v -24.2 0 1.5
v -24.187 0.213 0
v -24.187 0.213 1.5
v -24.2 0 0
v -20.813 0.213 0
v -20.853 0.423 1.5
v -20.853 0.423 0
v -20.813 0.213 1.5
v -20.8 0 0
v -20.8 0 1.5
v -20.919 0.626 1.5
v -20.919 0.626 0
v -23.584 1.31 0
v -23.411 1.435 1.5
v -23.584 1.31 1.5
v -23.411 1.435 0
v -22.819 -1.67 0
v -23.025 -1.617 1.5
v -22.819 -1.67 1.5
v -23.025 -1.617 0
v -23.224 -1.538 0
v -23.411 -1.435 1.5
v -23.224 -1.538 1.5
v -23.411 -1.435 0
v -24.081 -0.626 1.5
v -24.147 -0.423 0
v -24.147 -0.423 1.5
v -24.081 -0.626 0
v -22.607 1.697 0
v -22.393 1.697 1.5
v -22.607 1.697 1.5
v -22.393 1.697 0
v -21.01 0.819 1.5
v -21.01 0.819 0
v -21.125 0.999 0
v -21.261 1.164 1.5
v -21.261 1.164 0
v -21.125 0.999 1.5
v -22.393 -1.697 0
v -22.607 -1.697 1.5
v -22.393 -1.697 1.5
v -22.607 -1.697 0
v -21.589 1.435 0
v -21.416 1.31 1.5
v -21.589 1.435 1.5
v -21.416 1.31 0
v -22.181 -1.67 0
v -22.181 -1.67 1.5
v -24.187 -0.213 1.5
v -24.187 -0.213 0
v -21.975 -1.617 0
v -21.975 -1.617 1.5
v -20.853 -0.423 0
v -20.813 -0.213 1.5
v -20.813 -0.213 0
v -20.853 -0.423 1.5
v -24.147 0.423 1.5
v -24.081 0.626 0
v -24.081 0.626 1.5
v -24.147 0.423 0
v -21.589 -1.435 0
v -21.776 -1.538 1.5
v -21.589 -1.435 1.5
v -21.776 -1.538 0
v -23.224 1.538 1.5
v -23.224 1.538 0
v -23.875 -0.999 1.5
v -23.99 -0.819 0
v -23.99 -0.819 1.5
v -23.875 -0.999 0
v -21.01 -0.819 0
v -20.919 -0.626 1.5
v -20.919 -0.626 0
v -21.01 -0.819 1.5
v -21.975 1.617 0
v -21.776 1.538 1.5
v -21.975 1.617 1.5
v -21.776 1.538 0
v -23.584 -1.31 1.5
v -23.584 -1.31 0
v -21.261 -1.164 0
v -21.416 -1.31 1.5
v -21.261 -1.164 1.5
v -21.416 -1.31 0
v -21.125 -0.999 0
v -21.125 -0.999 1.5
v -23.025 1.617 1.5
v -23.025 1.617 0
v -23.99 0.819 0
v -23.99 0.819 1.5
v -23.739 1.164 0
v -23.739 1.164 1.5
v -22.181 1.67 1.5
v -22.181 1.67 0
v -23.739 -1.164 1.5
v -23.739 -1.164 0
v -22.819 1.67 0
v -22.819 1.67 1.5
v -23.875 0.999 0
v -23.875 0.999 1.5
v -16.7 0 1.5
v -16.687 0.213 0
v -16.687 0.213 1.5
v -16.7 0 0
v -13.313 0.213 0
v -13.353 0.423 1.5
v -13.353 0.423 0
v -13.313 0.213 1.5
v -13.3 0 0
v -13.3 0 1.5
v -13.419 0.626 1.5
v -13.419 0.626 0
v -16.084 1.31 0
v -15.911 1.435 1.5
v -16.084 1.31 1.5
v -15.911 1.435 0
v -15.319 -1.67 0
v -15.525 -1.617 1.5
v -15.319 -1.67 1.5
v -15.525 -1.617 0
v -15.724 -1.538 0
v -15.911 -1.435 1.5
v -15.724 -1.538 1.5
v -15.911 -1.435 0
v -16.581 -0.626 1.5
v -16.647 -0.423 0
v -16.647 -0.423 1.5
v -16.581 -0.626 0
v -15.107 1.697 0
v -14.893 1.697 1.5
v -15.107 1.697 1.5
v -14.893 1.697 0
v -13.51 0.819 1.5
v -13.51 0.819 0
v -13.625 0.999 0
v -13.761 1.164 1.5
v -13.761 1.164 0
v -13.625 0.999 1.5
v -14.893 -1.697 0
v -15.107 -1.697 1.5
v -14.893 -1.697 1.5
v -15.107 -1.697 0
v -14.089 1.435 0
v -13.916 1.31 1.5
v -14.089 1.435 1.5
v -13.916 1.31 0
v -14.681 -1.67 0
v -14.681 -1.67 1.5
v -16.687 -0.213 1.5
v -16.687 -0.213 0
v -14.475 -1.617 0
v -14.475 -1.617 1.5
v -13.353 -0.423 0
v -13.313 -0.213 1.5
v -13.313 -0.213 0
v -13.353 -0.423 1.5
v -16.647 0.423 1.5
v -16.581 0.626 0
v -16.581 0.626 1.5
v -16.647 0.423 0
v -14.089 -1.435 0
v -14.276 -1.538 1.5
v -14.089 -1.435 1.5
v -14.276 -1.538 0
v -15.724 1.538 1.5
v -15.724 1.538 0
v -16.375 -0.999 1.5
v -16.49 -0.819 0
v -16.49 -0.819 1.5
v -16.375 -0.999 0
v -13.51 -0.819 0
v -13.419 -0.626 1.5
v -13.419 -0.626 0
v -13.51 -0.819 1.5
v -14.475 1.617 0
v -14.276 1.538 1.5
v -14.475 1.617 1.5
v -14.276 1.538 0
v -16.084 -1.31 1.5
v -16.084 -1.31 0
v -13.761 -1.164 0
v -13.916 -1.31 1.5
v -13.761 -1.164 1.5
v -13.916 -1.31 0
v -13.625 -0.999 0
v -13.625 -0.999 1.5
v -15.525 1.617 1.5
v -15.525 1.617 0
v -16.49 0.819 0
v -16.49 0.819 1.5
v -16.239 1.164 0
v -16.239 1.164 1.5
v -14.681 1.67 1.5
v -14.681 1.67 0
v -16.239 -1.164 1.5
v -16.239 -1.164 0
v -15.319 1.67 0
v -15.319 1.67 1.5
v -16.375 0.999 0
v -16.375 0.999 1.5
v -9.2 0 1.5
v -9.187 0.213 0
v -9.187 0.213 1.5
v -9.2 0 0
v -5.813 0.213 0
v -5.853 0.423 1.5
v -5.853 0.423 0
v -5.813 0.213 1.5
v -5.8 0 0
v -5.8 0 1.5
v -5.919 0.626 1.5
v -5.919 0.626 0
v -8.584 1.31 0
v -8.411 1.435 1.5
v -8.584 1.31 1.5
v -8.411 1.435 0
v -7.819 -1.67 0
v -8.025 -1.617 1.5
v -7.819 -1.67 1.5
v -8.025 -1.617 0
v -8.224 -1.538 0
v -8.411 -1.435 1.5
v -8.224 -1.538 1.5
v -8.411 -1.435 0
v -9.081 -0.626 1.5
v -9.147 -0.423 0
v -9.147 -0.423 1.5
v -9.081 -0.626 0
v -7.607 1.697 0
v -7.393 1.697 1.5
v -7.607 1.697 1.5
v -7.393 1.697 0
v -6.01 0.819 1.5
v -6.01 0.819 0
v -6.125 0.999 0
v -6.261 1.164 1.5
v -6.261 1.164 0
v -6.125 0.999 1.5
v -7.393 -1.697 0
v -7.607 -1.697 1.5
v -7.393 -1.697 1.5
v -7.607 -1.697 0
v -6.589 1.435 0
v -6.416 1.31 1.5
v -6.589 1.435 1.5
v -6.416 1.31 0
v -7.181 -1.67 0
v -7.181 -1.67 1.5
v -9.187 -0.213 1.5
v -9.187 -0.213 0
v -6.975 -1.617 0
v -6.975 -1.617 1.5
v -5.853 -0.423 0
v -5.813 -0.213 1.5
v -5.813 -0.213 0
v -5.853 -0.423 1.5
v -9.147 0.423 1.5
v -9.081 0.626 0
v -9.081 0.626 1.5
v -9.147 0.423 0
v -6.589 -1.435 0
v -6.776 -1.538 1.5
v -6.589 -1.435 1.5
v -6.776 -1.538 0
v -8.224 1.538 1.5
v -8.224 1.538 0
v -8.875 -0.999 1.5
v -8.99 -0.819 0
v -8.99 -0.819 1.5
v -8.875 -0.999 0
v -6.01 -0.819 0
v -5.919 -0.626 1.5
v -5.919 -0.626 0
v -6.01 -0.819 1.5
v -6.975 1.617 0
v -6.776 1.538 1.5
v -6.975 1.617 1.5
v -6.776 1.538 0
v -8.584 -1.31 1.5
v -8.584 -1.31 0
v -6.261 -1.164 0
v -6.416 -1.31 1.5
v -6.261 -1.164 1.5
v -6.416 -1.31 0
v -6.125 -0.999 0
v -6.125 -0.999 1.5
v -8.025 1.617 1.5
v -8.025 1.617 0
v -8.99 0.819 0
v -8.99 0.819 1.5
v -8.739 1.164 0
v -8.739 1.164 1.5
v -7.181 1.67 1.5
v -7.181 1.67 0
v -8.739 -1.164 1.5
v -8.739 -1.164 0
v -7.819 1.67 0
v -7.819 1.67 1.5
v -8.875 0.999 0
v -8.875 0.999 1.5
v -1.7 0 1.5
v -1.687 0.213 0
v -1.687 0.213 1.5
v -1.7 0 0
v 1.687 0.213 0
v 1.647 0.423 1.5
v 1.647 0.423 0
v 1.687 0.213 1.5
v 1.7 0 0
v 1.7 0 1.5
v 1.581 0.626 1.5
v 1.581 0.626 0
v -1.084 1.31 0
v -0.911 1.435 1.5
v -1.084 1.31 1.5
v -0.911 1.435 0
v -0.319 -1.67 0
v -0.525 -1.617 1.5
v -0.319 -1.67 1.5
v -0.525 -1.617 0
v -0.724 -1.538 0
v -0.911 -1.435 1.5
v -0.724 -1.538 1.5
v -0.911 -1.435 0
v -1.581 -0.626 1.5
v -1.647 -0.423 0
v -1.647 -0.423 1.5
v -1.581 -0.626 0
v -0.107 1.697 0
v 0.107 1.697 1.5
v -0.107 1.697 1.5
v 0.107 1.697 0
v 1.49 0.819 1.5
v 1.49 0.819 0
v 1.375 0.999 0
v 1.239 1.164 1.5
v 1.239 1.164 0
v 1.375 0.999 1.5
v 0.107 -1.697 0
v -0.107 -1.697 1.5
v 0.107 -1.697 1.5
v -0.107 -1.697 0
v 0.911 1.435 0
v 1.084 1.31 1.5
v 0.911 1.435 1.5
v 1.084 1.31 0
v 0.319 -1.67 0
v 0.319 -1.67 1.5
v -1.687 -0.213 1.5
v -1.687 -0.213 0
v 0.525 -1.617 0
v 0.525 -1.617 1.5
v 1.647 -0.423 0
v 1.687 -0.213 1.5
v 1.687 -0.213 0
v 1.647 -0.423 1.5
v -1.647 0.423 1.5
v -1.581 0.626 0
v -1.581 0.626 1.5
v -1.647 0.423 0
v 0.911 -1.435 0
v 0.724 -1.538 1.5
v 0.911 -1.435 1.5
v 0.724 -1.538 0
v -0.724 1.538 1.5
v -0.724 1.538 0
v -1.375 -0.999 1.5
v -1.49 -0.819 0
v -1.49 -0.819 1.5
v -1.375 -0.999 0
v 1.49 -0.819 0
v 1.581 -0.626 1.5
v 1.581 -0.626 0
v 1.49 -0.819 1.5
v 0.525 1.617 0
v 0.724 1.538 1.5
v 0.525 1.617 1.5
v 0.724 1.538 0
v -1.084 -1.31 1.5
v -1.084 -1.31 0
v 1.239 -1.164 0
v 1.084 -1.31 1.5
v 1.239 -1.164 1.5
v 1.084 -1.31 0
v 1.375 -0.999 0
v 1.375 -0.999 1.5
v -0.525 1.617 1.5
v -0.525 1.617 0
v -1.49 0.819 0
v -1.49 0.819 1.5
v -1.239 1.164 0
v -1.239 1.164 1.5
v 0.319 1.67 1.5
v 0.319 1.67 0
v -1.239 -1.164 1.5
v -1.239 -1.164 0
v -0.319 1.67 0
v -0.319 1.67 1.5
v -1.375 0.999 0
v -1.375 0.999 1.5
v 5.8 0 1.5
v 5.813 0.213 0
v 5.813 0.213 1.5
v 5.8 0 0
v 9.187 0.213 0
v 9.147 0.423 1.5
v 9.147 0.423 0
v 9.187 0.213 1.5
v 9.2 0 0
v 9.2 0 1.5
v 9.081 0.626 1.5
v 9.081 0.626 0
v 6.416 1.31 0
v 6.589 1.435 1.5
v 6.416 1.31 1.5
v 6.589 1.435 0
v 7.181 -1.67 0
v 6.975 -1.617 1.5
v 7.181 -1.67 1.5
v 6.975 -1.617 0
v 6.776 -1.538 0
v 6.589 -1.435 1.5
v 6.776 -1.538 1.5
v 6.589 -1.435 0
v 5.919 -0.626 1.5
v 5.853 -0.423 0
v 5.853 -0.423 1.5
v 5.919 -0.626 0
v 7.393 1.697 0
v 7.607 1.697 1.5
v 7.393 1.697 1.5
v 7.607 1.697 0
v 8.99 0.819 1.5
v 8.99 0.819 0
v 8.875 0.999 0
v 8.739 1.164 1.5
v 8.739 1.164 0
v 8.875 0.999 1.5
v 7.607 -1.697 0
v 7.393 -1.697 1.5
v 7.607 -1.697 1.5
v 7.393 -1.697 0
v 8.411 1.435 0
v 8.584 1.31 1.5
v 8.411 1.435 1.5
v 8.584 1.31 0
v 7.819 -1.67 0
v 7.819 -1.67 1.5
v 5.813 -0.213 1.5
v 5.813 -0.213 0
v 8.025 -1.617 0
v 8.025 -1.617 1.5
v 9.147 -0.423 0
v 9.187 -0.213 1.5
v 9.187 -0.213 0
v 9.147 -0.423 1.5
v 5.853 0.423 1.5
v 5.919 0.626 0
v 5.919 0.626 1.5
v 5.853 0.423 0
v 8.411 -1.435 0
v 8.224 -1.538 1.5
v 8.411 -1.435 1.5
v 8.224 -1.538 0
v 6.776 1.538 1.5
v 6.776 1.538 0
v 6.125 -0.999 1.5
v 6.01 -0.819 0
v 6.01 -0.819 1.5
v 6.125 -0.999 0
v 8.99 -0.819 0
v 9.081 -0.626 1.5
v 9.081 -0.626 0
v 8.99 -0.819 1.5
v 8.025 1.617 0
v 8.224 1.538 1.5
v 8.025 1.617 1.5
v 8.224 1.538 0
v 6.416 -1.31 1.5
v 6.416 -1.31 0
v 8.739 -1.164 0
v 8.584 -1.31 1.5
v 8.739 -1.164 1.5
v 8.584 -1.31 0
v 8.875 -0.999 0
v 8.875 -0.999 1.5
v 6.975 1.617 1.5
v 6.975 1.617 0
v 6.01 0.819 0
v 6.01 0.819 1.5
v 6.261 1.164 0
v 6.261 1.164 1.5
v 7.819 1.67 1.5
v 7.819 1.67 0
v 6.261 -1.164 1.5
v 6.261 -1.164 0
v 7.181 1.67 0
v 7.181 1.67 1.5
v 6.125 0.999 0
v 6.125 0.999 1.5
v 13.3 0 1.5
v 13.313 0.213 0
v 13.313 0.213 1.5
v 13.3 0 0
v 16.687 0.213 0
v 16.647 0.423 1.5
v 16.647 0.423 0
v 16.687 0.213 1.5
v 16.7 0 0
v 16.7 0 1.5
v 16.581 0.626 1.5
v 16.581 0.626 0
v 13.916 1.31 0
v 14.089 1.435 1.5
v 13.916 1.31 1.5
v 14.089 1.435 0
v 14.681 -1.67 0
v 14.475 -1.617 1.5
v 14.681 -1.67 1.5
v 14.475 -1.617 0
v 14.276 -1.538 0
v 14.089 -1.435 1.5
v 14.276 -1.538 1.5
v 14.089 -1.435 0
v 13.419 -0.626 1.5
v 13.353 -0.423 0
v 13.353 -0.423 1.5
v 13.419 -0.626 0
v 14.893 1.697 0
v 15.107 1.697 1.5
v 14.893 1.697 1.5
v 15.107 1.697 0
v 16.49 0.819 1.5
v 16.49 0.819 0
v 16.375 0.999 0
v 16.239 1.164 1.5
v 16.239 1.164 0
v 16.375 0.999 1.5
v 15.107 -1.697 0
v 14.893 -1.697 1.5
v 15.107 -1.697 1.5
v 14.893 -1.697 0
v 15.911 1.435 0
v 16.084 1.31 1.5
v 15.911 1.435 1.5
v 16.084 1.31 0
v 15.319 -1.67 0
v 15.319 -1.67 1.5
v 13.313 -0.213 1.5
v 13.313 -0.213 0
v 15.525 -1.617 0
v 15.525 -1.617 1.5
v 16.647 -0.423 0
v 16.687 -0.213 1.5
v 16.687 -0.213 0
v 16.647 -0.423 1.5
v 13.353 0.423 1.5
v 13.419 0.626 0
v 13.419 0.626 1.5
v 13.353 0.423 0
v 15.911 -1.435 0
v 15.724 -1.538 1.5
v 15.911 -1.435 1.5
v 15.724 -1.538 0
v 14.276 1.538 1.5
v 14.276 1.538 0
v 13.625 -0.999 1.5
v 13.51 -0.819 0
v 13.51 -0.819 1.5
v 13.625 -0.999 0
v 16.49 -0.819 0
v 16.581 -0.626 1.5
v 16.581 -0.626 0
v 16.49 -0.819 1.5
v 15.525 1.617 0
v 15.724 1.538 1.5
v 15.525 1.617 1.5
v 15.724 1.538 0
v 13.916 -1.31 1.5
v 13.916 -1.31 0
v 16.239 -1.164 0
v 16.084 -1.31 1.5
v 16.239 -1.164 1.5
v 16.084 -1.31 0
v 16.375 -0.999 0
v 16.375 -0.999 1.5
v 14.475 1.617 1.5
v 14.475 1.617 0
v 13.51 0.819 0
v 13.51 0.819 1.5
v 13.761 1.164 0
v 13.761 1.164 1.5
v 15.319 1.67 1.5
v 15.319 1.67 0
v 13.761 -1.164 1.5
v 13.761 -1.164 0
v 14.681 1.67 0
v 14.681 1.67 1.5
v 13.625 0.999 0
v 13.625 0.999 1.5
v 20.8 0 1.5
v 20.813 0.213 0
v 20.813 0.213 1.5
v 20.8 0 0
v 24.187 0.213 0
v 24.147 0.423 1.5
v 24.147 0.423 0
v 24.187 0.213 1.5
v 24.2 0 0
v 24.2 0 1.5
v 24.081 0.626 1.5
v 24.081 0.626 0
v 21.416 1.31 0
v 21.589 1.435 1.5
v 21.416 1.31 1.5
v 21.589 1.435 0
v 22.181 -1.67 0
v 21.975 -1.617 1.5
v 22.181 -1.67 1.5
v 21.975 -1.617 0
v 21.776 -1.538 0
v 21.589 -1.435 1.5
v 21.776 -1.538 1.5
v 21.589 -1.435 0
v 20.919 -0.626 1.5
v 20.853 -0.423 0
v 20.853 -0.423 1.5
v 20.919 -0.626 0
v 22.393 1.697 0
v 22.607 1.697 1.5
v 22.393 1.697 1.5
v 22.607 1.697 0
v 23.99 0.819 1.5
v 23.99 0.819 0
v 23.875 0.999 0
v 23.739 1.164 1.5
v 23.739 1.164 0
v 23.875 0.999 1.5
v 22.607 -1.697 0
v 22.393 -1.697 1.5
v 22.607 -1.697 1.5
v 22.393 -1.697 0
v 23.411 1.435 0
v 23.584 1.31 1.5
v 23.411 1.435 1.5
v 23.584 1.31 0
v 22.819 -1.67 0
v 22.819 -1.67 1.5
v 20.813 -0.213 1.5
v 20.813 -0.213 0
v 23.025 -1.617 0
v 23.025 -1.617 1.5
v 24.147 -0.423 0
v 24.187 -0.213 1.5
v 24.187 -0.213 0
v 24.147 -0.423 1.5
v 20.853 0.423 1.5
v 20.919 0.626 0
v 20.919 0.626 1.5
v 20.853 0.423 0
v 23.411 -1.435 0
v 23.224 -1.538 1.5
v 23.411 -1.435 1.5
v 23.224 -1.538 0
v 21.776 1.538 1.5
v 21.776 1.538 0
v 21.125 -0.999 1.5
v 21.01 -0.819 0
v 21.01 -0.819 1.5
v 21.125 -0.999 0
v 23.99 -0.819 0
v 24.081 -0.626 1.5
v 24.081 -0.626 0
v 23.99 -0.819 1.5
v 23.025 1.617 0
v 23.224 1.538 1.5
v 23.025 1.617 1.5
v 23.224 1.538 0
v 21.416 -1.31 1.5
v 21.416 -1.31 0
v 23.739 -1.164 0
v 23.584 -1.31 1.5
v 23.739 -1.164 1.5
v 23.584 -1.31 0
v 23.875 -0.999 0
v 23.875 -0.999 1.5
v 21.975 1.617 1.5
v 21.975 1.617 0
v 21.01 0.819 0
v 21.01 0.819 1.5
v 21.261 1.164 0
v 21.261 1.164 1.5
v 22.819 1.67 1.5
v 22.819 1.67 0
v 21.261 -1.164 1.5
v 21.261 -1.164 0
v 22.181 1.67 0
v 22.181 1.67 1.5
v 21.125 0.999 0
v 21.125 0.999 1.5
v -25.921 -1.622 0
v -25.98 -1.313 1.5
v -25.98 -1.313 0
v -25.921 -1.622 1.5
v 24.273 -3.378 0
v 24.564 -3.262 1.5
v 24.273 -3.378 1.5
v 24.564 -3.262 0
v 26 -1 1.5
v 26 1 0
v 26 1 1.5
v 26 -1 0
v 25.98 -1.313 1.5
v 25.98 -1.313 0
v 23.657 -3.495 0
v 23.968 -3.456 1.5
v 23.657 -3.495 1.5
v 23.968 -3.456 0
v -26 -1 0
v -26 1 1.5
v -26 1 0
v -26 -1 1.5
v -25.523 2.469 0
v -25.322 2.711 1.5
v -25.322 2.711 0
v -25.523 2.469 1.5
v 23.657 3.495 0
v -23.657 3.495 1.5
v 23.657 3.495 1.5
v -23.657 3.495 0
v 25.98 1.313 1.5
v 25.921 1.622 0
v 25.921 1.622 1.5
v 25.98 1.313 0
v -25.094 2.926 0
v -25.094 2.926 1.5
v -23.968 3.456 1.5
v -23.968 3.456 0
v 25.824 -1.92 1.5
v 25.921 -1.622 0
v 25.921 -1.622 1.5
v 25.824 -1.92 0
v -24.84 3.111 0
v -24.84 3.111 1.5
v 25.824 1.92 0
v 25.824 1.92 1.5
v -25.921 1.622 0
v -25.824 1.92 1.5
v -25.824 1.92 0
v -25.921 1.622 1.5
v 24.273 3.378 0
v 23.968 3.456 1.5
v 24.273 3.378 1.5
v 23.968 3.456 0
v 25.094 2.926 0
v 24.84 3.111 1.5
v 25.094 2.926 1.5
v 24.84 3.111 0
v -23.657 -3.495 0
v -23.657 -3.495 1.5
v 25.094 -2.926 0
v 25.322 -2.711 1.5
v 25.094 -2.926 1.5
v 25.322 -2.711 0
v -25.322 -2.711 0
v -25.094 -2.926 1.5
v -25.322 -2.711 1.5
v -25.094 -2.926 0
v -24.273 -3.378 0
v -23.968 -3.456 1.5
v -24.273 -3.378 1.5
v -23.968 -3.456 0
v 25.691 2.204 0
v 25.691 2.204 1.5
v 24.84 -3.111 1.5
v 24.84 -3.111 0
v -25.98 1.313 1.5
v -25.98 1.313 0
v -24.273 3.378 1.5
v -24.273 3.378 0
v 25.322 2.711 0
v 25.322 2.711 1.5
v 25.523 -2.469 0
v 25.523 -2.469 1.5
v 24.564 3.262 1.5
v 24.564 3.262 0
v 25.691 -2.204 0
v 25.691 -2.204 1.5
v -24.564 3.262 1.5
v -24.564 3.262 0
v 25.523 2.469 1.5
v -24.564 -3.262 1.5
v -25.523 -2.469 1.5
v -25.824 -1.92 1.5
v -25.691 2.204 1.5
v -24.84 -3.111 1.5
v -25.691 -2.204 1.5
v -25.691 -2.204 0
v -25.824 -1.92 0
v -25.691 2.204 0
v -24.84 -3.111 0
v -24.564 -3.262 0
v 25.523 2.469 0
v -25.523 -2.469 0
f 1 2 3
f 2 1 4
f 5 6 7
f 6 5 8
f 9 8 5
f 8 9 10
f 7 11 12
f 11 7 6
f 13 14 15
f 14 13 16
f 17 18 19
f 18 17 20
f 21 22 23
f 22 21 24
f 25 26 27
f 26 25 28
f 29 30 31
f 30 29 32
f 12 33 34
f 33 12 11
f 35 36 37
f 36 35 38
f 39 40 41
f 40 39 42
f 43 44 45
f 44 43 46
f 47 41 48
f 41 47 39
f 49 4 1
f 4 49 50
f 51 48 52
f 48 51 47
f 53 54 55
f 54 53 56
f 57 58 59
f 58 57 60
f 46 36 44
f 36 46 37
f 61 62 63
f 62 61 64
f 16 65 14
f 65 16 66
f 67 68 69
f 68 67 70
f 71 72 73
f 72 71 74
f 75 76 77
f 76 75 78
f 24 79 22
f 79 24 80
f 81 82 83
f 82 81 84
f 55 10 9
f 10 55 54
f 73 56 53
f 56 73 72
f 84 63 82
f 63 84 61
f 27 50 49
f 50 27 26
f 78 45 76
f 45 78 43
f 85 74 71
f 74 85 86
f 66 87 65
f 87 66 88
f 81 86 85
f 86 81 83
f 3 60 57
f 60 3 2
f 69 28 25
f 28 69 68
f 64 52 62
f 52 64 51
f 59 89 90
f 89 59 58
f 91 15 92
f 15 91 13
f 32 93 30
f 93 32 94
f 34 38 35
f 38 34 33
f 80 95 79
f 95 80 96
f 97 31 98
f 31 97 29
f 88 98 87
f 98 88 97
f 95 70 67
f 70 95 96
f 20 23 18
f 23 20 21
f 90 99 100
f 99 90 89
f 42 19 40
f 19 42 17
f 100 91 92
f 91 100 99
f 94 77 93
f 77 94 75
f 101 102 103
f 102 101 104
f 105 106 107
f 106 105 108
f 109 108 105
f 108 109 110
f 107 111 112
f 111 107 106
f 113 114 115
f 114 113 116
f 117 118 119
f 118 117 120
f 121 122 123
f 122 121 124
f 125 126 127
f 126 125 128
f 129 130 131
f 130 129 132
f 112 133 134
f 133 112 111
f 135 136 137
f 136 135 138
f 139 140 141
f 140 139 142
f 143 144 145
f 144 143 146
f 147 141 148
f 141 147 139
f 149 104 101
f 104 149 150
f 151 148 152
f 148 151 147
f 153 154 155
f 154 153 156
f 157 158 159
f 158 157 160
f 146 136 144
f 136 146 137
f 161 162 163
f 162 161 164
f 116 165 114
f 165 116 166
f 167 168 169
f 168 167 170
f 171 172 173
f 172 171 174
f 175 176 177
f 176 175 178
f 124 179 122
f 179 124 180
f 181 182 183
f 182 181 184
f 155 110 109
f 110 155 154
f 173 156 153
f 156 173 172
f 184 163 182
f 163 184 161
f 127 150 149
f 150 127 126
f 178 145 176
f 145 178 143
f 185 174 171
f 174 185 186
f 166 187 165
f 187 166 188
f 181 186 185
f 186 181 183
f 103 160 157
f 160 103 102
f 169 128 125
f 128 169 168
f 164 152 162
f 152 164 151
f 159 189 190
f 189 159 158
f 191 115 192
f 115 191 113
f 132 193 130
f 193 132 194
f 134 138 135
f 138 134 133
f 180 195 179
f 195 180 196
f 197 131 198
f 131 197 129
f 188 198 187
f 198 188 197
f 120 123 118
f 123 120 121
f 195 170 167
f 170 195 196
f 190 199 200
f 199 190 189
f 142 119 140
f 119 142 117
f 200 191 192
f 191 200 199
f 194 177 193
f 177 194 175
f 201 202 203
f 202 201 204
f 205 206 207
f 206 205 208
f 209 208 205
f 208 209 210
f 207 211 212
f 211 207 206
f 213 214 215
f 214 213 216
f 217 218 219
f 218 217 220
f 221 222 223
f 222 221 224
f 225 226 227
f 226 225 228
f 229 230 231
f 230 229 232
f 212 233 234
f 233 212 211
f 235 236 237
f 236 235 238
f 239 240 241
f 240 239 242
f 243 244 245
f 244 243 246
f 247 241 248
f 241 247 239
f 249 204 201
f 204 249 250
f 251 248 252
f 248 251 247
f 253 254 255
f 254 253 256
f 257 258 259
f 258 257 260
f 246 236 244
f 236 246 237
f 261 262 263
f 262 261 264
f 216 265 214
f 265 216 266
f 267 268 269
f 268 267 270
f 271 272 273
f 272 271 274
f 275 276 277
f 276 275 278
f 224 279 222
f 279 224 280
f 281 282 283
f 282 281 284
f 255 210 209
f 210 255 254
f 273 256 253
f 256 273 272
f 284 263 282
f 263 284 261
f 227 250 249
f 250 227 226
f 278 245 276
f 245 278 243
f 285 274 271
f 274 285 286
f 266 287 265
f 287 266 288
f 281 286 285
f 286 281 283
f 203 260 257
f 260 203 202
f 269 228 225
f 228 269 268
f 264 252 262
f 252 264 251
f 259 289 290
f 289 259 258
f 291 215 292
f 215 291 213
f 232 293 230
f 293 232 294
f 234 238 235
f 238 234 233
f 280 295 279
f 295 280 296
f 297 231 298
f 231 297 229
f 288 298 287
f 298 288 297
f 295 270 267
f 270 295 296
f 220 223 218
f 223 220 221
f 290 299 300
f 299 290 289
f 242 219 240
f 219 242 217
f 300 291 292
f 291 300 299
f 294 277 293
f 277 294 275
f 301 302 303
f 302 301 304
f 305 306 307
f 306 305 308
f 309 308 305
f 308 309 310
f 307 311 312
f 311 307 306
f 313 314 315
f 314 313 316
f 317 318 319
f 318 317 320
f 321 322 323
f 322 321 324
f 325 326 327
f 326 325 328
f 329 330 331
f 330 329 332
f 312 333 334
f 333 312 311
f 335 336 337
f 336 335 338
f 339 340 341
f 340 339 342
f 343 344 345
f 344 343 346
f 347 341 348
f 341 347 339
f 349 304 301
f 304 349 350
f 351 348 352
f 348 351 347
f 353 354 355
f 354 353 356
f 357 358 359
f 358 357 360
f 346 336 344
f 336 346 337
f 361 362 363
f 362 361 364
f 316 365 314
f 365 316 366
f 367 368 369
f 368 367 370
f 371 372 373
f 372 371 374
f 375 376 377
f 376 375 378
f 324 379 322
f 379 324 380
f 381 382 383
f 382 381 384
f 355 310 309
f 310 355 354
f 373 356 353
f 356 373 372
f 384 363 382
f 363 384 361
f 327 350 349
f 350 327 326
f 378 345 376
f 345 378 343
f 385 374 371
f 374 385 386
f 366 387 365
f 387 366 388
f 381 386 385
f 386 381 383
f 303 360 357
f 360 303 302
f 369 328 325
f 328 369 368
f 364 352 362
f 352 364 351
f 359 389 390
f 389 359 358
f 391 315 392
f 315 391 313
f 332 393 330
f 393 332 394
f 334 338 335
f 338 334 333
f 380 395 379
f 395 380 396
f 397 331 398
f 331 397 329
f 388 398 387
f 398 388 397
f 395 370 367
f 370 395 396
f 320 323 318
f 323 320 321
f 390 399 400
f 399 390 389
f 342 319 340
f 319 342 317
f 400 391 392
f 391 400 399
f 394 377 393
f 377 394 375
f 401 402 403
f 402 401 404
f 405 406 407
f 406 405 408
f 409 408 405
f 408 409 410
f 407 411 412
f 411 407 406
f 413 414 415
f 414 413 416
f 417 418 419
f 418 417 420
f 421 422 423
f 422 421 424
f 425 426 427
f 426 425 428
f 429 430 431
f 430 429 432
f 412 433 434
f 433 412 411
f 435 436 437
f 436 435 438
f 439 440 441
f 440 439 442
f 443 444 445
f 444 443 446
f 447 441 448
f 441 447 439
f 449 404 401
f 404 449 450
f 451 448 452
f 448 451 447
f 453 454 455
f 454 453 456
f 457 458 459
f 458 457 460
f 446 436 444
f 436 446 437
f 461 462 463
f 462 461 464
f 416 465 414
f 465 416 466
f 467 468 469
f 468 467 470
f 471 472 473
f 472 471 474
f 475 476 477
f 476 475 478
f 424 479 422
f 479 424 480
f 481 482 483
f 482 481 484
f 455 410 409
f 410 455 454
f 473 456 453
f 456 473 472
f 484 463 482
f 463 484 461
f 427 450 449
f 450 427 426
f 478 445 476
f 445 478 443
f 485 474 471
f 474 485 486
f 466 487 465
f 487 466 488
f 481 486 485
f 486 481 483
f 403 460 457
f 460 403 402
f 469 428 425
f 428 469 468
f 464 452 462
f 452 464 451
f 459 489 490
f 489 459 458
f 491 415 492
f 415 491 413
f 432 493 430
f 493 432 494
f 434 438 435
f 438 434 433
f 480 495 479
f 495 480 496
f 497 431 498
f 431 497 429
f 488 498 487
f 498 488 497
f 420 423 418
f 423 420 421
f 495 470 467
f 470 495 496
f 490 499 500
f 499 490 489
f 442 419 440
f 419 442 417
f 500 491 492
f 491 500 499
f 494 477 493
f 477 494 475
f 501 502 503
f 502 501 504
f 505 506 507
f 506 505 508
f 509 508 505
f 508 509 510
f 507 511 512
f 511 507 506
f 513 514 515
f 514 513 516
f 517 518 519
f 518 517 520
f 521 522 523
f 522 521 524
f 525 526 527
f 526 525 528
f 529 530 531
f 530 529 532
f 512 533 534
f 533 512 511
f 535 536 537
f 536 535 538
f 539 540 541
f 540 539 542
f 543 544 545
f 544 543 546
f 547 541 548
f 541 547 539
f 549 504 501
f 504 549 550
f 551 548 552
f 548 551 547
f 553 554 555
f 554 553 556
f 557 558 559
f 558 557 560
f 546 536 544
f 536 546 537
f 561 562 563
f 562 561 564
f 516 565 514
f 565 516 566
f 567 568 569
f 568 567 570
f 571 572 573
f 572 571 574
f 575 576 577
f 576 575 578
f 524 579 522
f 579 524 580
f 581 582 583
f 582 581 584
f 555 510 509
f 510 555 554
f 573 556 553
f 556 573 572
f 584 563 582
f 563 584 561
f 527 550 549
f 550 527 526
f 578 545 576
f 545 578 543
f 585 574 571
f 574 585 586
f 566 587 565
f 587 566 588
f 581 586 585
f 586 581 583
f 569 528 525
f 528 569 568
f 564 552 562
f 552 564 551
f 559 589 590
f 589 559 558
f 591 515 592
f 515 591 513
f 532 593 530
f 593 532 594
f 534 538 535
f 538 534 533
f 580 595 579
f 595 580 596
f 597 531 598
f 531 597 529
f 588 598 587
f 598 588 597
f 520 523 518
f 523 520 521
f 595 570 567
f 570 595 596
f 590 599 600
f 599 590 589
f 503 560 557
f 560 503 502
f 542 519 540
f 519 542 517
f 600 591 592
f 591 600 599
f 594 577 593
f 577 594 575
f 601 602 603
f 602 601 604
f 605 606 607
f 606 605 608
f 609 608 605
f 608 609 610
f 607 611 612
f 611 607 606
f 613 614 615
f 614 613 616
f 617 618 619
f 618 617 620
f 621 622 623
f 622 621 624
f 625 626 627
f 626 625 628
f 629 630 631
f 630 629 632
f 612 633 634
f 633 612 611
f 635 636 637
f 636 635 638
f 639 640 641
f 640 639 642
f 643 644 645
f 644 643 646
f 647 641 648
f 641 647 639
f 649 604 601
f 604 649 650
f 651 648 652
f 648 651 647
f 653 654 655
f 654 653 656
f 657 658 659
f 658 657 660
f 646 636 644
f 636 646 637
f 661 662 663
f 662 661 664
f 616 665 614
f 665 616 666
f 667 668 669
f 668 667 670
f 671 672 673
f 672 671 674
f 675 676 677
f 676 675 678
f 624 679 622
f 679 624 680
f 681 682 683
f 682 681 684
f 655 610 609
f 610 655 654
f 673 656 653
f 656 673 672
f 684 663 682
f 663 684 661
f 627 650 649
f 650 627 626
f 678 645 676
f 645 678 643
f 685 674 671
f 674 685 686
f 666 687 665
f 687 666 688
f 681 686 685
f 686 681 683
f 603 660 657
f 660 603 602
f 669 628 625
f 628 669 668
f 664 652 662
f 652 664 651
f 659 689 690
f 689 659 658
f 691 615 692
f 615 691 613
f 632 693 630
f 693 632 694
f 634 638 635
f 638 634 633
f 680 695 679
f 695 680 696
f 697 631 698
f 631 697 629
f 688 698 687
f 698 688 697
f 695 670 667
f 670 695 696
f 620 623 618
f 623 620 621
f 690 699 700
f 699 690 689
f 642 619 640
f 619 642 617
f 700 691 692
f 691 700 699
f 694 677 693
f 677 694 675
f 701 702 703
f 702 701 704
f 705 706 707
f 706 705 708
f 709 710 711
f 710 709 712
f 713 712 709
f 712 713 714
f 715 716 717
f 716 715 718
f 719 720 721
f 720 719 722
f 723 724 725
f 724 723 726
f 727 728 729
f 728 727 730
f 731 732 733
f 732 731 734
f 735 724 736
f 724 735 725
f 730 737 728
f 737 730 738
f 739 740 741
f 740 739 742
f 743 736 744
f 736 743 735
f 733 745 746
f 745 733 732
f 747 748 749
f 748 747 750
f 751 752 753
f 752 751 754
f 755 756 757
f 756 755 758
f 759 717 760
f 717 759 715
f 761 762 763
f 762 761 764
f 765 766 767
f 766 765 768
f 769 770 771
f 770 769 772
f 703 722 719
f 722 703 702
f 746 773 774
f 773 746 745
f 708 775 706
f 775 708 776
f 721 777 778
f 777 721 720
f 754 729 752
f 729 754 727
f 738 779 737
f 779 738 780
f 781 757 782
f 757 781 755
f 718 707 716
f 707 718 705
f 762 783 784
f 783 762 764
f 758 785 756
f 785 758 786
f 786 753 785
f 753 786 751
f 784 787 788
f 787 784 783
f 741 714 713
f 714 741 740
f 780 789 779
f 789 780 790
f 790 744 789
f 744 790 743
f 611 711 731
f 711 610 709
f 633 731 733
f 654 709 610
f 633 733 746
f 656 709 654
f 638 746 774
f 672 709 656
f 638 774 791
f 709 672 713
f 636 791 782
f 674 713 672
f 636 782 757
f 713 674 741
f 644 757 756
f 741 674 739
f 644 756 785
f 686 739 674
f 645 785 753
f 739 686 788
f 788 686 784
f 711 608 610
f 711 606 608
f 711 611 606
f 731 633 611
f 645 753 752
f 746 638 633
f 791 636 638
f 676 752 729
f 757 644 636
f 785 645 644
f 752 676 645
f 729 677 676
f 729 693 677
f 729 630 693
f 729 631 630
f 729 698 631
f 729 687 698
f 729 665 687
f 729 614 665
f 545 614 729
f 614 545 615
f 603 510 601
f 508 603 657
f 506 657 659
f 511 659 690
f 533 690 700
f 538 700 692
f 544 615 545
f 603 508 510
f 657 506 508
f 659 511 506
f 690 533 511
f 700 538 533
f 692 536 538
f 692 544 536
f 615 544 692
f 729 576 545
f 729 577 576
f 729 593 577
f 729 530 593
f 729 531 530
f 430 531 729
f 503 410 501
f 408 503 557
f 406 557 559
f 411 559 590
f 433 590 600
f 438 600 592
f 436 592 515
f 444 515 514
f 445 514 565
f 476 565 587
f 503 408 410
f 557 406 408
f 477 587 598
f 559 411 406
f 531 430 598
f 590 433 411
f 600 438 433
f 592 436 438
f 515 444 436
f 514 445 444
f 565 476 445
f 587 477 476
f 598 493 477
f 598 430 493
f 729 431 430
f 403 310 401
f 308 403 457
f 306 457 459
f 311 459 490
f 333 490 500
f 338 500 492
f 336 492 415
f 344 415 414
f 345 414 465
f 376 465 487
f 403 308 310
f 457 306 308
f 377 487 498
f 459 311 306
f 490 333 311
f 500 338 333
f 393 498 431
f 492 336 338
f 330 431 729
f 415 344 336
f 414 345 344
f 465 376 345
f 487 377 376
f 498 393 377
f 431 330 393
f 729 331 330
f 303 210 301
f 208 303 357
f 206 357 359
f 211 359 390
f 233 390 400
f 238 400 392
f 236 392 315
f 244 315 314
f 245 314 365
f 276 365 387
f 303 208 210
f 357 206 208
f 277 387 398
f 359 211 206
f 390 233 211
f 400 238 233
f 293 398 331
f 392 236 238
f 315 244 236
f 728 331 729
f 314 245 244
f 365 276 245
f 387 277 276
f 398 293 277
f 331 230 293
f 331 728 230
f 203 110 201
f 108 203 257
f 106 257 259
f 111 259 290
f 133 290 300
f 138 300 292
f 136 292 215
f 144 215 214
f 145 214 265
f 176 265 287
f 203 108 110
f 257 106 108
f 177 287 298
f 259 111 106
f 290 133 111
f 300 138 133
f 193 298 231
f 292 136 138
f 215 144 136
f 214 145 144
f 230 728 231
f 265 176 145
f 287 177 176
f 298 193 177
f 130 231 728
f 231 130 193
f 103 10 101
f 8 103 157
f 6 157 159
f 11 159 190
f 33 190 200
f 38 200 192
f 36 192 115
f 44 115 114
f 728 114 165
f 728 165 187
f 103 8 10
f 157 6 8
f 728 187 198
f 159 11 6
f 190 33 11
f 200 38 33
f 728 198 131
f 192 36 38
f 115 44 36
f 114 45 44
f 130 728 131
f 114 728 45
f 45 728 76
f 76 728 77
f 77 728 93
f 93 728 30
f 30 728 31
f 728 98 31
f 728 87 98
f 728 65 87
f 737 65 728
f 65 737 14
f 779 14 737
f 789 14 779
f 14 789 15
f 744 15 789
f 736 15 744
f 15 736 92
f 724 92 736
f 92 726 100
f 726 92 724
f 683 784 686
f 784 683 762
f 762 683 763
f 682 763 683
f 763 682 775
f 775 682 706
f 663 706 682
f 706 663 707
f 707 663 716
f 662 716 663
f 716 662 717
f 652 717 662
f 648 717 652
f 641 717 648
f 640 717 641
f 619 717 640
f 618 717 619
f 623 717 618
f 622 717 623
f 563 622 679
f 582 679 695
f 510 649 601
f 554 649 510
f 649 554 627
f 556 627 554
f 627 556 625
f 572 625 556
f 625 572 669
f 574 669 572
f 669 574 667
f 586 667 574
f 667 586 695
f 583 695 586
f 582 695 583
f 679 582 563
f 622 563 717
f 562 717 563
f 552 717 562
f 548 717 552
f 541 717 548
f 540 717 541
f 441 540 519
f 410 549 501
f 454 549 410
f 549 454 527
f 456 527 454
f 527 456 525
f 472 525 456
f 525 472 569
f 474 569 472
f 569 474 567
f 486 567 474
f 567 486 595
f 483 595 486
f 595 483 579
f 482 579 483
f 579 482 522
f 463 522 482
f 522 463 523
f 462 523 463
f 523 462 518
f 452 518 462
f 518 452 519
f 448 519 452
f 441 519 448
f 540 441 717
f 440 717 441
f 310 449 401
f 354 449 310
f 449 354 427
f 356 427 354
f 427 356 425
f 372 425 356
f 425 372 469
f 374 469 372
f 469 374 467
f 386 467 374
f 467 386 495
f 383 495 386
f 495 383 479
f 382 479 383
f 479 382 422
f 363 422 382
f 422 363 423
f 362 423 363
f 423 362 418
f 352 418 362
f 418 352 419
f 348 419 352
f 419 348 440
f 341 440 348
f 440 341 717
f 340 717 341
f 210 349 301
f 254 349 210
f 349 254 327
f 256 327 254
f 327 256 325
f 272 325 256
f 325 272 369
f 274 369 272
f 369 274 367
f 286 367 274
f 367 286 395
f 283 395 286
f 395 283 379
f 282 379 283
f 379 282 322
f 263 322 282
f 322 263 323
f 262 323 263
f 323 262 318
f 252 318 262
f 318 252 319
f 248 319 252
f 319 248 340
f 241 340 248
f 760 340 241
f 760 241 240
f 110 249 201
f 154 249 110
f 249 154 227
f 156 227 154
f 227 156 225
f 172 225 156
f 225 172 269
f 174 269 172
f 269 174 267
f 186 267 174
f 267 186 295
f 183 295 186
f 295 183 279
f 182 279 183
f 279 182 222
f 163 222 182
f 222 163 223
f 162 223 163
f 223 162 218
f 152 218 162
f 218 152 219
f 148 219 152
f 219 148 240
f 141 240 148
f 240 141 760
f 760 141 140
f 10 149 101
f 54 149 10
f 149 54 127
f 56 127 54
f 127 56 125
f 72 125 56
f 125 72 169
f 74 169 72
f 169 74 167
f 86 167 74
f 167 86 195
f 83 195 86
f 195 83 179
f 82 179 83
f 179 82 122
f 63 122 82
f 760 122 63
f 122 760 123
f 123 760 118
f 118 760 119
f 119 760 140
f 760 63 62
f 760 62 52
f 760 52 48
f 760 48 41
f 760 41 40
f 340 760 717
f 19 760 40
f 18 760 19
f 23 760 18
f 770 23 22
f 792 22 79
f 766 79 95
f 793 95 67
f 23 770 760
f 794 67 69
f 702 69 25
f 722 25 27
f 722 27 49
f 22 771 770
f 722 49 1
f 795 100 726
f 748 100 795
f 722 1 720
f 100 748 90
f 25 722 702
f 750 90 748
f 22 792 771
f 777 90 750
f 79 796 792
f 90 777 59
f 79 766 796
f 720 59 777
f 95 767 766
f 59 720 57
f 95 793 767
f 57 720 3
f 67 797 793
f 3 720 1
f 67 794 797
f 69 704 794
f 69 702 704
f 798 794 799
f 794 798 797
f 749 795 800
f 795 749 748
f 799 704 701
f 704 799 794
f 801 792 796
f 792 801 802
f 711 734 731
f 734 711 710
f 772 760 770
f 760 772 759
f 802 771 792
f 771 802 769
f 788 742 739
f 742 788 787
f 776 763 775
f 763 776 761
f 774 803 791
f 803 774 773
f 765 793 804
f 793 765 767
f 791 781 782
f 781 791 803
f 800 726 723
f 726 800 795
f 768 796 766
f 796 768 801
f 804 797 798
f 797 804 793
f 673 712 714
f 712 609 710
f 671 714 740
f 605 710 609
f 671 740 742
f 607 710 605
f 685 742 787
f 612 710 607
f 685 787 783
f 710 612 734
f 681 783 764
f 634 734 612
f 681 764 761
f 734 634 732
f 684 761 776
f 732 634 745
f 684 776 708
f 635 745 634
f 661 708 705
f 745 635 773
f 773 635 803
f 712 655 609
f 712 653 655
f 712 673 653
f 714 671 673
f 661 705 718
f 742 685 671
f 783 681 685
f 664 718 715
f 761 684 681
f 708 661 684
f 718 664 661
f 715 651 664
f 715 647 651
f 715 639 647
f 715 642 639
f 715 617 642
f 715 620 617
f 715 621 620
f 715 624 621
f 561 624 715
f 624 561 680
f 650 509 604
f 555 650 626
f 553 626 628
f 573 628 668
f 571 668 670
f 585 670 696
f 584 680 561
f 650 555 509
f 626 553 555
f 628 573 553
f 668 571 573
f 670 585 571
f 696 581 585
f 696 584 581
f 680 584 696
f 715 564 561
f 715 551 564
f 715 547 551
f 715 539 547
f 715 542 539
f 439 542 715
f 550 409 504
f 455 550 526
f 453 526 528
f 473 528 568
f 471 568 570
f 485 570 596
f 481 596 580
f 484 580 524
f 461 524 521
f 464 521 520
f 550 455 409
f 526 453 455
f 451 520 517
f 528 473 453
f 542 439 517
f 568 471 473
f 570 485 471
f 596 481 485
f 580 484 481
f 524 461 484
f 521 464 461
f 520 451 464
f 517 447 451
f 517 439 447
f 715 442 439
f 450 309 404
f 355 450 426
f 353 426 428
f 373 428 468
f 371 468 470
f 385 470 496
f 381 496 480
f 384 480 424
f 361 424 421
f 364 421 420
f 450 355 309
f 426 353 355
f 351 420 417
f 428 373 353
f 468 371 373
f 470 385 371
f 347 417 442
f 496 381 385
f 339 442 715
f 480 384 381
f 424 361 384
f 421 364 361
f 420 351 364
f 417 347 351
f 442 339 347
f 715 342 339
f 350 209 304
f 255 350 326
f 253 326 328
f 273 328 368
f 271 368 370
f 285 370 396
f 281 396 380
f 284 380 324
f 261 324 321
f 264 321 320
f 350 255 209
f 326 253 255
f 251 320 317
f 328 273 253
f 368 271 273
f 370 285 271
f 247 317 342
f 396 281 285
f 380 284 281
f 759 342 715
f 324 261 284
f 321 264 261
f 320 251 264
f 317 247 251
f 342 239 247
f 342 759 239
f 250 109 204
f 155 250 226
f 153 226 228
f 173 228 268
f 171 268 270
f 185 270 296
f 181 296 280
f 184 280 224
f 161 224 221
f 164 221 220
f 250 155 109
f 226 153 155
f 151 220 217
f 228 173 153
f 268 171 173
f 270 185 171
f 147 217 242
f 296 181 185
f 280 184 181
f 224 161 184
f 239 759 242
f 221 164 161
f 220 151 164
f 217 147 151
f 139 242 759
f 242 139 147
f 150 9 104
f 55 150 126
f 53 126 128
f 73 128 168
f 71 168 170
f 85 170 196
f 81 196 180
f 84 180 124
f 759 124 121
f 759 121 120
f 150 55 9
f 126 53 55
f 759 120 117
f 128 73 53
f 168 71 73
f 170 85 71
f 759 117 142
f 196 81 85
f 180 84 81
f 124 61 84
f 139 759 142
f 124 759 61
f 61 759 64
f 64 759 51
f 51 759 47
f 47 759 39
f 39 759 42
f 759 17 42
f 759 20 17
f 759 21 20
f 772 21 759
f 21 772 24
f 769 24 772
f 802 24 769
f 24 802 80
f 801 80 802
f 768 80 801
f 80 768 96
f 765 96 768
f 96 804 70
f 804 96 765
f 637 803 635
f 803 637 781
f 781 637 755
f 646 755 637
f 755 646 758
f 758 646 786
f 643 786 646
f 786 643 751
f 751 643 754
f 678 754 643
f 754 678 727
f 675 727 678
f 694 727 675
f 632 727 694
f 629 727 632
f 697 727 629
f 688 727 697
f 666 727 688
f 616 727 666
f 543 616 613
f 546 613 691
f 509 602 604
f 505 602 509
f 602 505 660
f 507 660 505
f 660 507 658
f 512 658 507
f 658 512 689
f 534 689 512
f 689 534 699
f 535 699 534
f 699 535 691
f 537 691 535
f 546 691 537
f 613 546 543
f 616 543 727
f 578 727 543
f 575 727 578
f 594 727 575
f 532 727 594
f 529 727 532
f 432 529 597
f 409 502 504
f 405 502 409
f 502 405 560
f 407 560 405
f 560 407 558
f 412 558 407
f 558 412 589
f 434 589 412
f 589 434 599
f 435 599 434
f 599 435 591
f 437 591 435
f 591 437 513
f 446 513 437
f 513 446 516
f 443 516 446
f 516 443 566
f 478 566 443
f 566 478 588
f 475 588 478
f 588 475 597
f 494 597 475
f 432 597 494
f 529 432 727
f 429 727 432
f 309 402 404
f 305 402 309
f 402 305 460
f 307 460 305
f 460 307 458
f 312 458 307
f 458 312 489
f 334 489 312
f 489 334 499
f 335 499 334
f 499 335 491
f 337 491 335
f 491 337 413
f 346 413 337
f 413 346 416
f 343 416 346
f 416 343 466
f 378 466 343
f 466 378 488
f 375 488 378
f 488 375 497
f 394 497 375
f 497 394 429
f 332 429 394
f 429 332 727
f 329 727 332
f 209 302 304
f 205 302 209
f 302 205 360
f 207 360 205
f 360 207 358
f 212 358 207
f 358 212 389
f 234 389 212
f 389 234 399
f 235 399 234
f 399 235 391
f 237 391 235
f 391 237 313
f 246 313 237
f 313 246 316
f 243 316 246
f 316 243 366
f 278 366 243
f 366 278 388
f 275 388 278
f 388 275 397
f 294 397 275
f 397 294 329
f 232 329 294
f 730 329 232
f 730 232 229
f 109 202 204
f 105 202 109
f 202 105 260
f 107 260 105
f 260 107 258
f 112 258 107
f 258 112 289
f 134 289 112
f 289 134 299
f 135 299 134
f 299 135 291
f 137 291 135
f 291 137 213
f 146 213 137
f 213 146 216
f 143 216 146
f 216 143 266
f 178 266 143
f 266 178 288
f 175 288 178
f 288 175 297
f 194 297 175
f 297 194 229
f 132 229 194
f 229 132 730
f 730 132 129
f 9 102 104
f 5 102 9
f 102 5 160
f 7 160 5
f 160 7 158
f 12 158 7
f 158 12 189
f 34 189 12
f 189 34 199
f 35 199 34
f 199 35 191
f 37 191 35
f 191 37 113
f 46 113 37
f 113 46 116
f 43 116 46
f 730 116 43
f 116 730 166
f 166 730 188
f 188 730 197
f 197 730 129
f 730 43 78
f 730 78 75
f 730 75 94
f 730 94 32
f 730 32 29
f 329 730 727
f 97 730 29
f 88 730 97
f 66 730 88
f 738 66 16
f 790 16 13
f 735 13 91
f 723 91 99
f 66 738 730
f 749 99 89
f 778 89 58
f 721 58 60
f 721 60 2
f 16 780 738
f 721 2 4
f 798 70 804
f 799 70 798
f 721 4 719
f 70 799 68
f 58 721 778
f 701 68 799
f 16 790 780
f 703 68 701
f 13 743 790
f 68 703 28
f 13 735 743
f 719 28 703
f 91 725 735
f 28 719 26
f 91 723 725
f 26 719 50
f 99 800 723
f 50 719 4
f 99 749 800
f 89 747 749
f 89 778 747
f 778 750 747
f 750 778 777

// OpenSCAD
$fn = 50;


difference() {
	union() {
		translate(v = [0, 0, 0]) {
			rotate(a = [0, 0, 0]) {
				hull() {
					translate(v = [-23.5000000000, 1.0000000000, 0]) {
						rotate(a = [0, 0, 0]) {
							translate(v = [0, 0, 0]) {
								rotate(a = [0, 0, 0]) {
									cylinder(h = 1.5000000000, r = 2.5000000000);
								}
							}
						}
					}
					translate(v = [23.5000000000, 1.0000000000, 0]) {
						rotate(a = [0, 0, 0]) {
							translate(v = [0, 0, 0]) {
								rotate(a = [0, 0, 0]) {
									cylinder(h = 1.5000000000, r = 2.5000000000);
								}
							}
						}
					}
					translate(v = [-23.5000000000, -1.0000000000, 0]) {
						rotate(a = [0, 0, 0]) {
							translate(v = [0, 0, 0]) {
								rotate(a = [0, 0, 0]) {
									cylinder(h = 1.5000000000, r = 2.5000000000);
								}
							}
						}
					}
					translate(v = [23.5000000000, -1.0000000000, 0]) {
						rotate(a = [0, 0, 0]) {
							translate(v = [0, 0, 0]) {
								rotate(a = [0, 0, 0]) {
									cylinder(h = 1.5000000000, r = 2.5000000000);
								}
							}
						}
					}
				}
			}
		}
	}
	union() {
		translate(v = [-22.5000000000, 0.0000000000, 0]) {
			rotate(a = [0, 0, 0]) {
				translate(v = [0, 0, -50]) {
					rotate(a = [0, 0, 0]) {
						cylinder(h = 100, r = 1.7000000000);
					}
				}
			}
		}
		translate(v = [-15.0000000000, 0.0000000000, 0]) {
			rotate(a = [0, 0, 0]) {
				translate(v = [0, 0, -50]) {
					rotate(a = [0, 0, 0]) {
						cylinder(h = 100, r = 1.7000000000);
					}
				}
			}
		}
		translate(v = [-7.5000000000, 0.0000000000, 0]) {
			rotate(a = [0, 0, 0]) {
				translate(v = [0, 0, -50]) {
					rotate(a = [0, 0, 0]) {
						cylinder(h = 100, r = 1.7000000000);
					}
				}
			}
		}
		translate(v = [0.0000000000, 0.0000000000, 0]) {
			rotate(a = [0, 0, 0]) {
				translate(v = [0, 0, -50]) {
					rotate(a = [0, 0, 0]) {
						cylinder(h = 100, r = 1.7000000000);
					}
				}
			}
		}
		translate(v = [7.5000000000, 0.0000000000, 0]) {
			rotate(a = [0, 0, 0]) {
				translate(v = [0, 0, -50]) {
					rotate(a = [0, 0, 0]) {
						cylinder(h = 100, r = 1.7000000000);
					}
				}
			}
		}
		translate(v = [15.0000000000, 0.0000000000, 0]) {
			rotate(a = [0, 0, 0]) {
				translate(v = [0, 0, -50]) {
					rotate(a = [0, 0, 0]) {
						cylinder(h = 100, r = 1.7000000000);
					}
				}
			}
		}
		translate(v = [22.5000000000, 0.0000000000, 0]) {
			rotate(a = [0, 0, 0]) {
				translate(v = [0, 0, -50]) {
					rotate(a = [0, 0, 0]) {
						cylinder(h = 100, r = 1.7000000000);
					}
				}
			}
		}
	}
}
